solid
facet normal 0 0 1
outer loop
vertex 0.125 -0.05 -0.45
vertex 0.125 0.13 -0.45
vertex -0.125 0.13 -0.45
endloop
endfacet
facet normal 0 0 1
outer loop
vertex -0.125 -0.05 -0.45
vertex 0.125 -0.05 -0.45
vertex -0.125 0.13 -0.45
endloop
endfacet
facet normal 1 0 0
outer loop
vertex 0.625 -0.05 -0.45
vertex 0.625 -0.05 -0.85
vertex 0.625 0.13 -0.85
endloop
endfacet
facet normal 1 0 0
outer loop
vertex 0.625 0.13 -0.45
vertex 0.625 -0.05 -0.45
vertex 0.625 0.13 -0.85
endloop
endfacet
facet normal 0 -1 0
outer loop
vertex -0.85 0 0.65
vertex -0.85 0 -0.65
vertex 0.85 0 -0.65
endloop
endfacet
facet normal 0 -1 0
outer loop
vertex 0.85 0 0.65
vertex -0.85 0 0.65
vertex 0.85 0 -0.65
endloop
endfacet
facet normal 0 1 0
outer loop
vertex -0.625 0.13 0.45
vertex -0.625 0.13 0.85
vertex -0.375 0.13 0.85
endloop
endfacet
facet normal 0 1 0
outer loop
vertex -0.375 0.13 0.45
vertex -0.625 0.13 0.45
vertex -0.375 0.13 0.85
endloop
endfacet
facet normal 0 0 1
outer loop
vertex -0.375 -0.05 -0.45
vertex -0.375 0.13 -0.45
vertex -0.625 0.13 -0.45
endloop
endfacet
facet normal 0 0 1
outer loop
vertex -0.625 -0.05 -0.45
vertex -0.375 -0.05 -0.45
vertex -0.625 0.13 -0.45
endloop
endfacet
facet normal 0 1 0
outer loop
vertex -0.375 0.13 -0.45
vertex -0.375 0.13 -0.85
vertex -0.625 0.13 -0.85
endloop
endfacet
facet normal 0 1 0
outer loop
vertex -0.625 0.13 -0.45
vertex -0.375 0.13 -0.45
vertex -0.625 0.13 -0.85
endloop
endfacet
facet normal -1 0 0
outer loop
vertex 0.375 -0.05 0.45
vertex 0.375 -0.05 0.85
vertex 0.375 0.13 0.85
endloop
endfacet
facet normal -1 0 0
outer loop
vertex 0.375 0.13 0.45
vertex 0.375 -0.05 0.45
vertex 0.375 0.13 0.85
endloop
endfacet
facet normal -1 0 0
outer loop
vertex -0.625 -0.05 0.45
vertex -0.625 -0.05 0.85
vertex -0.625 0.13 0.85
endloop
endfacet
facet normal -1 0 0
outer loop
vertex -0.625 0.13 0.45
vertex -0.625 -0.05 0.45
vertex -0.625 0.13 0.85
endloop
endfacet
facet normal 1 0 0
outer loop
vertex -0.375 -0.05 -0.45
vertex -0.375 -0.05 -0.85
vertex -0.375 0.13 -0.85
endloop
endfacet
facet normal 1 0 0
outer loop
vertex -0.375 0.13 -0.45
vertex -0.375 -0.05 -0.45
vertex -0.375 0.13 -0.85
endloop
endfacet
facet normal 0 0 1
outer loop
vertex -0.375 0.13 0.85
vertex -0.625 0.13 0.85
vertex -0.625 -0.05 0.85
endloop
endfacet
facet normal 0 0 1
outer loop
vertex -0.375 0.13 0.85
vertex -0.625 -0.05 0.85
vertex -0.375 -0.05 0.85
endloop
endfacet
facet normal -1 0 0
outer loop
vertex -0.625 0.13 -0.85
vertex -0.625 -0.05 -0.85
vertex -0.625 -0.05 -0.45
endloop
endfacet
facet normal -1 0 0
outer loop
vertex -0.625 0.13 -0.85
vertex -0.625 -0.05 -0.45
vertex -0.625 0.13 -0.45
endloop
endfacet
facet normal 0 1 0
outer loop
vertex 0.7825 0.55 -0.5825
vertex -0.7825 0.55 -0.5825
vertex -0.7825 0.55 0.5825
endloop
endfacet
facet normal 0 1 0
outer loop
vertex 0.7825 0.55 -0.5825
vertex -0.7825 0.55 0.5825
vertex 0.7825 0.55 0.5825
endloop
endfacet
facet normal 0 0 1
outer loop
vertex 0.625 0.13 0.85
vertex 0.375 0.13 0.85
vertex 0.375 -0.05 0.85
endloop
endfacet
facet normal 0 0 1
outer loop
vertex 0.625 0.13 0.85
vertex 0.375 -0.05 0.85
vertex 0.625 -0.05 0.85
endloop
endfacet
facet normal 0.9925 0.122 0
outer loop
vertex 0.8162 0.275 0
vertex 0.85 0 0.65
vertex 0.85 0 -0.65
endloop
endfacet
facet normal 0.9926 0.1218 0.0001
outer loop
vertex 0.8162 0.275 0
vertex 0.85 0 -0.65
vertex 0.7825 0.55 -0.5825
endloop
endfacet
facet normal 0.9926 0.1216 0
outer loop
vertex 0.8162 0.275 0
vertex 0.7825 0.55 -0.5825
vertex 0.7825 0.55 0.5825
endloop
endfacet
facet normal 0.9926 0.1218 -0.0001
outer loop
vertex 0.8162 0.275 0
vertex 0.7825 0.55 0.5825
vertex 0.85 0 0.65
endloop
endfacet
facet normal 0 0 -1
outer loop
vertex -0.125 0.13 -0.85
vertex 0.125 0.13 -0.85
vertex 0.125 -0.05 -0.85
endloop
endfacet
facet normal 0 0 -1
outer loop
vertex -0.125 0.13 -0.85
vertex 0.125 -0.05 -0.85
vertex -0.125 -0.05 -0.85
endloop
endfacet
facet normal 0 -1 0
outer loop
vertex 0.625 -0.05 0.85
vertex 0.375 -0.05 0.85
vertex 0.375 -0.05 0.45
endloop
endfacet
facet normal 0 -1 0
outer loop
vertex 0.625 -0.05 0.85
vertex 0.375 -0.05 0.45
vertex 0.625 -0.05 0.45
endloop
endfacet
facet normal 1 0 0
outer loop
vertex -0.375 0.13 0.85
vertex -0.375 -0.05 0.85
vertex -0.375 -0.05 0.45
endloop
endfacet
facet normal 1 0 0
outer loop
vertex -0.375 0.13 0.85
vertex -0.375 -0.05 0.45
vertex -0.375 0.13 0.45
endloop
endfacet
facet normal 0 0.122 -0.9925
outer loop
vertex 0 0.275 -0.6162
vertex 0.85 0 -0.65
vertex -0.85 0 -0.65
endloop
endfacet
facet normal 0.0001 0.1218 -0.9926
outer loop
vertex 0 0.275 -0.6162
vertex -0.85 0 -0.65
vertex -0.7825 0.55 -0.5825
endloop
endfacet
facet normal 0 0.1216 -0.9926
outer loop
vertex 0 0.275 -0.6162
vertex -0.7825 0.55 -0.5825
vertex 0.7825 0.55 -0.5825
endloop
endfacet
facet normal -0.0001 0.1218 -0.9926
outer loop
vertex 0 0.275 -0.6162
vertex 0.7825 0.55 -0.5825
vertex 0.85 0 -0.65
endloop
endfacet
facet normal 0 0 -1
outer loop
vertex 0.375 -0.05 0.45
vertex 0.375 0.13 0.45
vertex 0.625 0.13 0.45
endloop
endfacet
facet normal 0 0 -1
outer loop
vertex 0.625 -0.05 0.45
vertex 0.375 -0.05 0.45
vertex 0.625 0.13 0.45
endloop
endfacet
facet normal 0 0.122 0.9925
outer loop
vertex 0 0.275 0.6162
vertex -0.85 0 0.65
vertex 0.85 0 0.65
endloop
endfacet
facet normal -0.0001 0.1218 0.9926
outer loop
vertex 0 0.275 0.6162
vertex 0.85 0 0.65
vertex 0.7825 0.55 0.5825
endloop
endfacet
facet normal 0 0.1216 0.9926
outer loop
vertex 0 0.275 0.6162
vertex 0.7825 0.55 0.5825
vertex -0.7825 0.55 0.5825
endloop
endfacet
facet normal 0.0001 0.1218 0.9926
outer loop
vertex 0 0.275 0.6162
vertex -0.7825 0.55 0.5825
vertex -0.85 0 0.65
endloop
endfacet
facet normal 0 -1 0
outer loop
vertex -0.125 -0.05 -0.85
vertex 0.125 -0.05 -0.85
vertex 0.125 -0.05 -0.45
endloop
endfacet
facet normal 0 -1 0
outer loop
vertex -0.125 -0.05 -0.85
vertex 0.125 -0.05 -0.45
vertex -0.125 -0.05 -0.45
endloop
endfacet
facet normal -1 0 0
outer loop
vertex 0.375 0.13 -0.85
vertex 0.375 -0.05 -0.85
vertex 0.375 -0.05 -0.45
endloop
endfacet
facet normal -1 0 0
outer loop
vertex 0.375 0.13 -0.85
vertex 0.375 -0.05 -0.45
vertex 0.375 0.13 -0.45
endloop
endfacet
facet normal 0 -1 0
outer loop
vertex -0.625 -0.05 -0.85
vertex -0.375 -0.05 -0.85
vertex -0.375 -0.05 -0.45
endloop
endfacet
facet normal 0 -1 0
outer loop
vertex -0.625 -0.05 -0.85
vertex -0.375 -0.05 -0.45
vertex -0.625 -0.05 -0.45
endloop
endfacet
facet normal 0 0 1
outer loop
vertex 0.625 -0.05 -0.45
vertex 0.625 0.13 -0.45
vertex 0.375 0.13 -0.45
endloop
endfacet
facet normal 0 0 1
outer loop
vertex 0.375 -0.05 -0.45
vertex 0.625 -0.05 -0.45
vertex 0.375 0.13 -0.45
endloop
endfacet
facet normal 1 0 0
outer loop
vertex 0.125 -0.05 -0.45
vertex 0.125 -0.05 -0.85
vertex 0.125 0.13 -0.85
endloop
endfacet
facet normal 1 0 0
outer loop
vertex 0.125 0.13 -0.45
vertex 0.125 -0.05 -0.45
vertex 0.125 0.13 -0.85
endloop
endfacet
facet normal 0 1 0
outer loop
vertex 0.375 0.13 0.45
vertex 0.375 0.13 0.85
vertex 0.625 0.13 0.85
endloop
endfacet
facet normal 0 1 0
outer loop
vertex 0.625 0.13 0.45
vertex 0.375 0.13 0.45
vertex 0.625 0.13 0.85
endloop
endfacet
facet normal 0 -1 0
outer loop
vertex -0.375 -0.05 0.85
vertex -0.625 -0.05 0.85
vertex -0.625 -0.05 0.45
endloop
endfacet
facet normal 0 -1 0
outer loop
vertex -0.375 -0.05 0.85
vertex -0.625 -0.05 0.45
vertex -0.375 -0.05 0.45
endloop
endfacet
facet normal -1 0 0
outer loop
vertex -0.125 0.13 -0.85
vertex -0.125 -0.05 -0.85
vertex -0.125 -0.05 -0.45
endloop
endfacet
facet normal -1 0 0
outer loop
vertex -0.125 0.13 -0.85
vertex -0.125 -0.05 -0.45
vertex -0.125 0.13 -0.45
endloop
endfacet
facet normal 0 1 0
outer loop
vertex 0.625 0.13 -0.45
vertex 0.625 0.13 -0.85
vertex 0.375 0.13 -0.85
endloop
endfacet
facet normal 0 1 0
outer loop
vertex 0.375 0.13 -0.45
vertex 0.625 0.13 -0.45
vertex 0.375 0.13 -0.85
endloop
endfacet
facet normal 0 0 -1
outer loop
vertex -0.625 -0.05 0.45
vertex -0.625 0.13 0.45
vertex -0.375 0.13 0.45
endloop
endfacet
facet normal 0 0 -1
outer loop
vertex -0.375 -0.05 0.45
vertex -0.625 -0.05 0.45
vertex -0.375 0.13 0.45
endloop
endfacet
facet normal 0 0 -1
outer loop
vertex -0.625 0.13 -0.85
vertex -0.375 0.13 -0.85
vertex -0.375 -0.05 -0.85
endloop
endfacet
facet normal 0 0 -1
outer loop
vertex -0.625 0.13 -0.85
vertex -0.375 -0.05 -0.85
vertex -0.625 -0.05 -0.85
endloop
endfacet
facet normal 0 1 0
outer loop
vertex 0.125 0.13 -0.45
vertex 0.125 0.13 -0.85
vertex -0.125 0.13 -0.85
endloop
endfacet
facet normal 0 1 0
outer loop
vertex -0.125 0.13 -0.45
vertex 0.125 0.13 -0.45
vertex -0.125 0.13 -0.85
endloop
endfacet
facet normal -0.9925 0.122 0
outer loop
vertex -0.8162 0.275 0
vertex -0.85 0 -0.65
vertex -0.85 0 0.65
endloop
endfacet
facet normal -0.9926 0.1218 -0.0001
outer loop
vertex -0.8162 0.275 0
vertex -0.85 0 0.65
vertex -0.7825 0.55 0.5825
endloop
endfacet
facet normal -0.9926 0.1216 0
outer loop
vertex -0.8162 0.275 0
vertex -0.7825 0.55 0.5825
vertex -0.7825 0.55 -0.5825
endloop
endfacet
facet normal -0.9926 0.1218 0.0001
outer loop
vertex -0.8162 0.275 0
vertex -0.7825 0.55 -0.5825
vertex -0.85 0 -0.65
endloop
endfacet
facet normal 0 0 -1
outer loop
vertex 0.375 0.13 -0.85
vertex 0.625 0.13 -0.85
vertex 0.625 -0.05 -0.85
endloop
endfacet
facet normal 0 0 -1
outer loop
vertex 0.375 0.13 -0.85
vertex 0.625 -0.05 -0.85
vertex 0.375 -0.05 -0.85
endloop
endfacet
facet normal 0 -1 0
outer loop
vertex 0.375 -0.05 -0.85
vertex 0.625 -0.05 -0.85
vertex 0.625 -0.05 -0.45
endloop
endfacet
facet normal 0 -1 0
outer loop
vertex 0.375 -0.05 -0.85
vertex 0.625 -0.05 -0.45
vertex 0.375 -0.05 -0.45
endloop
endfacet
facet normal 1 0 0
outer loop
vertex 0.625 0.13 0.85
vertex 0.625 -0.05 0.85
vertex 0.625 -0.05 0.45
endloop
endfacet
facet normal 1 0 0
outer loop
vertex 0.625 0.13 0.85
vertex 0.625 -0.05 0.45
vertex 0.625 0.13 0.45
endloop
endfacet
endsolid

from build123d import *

# Parameters (mm, degrees)
CROQUIS1_W              = 1.7
CROQUIS1_H              = 1.3
SALIENTE_EXTRUIR1_DEPTH = 0.55
SALIENTE_EXTRUIR1_TAPER = 7
CROQUIS3_W              = 0.25
CROQUIS3_H              = 0.18
SALIENTE_EXTRUIR2_DEPTH = 0.4
MATRIZL1_COUNT          = 2
MATRIZL1_PITCH          = 0.5
MATRIZL2_COUNT          = 2
MATRIZL2_PITCH          = 0.5
CROQUIS6_W              = 0.25
CROQUIS6_H              = 0.18
SALIENTE_EXTRUIR3_DEPTH = 0.4
MATRIZL3_COUNT          = 2
MATRIZL3_PITCH          = 1


with BuildPart() as part:
    # Croquis1 → Saliente-Extruir1 (new body)
    with BuildSketch(Plane(origin=(0, 0, 0), x_dir=(1, 0, 0), z_dir=(0, 1, 0))):
        Rectangle(CROQUIS1_W, CROQUIS1_H)
    extrude(amount=SALIENTE_EXTRUIR1_DEPTH, taper=SALIENTE_EXTRUIR1_TAPER)


with BuildPart() as body_2:
    # Croquis3 → Saliente-Extruir2 (new body)
    with BuildSketch(Plane(origin=(0, 0.04, -0.85), x_dir=(-1, 0, 0), z_dir=(0, 0, -1))):
        Rectangle(CROQUIS3_W, CROQUIS3_H)
    saliente_extruir2 = extrude(amount=-SALIENTE_EXTRUIR2_DEPTH)


with BuildPart() as matrizl1_1:
    # MatrizL1: Saliente-Extruir2 ×2
    with Locations(*[(i * MATRIZL1_PITCH, 0, 0) for i in range(1, MATRIZL1_COUNT)]):
        add(saliente_extruir2)


with BuildPart() as matrizl2_1:
    # MatrizL2: Saliente-Extruir2 ×2
    with Locations(*[(-i * MATRIZL2_PITCH, 0, 0) for i in range(1, MATRIZL2_COUNT)]):
        add(saliente_extruir2)


with BuildPart() as body_5:
    # Croquis6 → Saliente-Extruir3 (new body)
    with BuildSketch(Plane(origin=(0.5, 0.04, 0.85), x_dir=(1, 0, 0), z_dir=(0, 0, 1))):
        Rectangle(CROQUIS6_W, CROQUIS6_H)
    saliente_extruir3 = extrude(amount=-SALIENTE_EXTRUIR3_DEPTH)


with BuildPart() as matrizl3_1:
    # MatrizL3: Saliente-Extruir3 ×2
    with Locations(*[(-i * MATRIZL3_PITCH, 0, 0) for i in range(1, MATRIZL3_COUNT)]):
        add(saliente_extruir3)


solid = Compound([part.part, body_2.part, matrizl1_1.part, matrizl2_1.part, body_5.part, matrizl3_1.part])
